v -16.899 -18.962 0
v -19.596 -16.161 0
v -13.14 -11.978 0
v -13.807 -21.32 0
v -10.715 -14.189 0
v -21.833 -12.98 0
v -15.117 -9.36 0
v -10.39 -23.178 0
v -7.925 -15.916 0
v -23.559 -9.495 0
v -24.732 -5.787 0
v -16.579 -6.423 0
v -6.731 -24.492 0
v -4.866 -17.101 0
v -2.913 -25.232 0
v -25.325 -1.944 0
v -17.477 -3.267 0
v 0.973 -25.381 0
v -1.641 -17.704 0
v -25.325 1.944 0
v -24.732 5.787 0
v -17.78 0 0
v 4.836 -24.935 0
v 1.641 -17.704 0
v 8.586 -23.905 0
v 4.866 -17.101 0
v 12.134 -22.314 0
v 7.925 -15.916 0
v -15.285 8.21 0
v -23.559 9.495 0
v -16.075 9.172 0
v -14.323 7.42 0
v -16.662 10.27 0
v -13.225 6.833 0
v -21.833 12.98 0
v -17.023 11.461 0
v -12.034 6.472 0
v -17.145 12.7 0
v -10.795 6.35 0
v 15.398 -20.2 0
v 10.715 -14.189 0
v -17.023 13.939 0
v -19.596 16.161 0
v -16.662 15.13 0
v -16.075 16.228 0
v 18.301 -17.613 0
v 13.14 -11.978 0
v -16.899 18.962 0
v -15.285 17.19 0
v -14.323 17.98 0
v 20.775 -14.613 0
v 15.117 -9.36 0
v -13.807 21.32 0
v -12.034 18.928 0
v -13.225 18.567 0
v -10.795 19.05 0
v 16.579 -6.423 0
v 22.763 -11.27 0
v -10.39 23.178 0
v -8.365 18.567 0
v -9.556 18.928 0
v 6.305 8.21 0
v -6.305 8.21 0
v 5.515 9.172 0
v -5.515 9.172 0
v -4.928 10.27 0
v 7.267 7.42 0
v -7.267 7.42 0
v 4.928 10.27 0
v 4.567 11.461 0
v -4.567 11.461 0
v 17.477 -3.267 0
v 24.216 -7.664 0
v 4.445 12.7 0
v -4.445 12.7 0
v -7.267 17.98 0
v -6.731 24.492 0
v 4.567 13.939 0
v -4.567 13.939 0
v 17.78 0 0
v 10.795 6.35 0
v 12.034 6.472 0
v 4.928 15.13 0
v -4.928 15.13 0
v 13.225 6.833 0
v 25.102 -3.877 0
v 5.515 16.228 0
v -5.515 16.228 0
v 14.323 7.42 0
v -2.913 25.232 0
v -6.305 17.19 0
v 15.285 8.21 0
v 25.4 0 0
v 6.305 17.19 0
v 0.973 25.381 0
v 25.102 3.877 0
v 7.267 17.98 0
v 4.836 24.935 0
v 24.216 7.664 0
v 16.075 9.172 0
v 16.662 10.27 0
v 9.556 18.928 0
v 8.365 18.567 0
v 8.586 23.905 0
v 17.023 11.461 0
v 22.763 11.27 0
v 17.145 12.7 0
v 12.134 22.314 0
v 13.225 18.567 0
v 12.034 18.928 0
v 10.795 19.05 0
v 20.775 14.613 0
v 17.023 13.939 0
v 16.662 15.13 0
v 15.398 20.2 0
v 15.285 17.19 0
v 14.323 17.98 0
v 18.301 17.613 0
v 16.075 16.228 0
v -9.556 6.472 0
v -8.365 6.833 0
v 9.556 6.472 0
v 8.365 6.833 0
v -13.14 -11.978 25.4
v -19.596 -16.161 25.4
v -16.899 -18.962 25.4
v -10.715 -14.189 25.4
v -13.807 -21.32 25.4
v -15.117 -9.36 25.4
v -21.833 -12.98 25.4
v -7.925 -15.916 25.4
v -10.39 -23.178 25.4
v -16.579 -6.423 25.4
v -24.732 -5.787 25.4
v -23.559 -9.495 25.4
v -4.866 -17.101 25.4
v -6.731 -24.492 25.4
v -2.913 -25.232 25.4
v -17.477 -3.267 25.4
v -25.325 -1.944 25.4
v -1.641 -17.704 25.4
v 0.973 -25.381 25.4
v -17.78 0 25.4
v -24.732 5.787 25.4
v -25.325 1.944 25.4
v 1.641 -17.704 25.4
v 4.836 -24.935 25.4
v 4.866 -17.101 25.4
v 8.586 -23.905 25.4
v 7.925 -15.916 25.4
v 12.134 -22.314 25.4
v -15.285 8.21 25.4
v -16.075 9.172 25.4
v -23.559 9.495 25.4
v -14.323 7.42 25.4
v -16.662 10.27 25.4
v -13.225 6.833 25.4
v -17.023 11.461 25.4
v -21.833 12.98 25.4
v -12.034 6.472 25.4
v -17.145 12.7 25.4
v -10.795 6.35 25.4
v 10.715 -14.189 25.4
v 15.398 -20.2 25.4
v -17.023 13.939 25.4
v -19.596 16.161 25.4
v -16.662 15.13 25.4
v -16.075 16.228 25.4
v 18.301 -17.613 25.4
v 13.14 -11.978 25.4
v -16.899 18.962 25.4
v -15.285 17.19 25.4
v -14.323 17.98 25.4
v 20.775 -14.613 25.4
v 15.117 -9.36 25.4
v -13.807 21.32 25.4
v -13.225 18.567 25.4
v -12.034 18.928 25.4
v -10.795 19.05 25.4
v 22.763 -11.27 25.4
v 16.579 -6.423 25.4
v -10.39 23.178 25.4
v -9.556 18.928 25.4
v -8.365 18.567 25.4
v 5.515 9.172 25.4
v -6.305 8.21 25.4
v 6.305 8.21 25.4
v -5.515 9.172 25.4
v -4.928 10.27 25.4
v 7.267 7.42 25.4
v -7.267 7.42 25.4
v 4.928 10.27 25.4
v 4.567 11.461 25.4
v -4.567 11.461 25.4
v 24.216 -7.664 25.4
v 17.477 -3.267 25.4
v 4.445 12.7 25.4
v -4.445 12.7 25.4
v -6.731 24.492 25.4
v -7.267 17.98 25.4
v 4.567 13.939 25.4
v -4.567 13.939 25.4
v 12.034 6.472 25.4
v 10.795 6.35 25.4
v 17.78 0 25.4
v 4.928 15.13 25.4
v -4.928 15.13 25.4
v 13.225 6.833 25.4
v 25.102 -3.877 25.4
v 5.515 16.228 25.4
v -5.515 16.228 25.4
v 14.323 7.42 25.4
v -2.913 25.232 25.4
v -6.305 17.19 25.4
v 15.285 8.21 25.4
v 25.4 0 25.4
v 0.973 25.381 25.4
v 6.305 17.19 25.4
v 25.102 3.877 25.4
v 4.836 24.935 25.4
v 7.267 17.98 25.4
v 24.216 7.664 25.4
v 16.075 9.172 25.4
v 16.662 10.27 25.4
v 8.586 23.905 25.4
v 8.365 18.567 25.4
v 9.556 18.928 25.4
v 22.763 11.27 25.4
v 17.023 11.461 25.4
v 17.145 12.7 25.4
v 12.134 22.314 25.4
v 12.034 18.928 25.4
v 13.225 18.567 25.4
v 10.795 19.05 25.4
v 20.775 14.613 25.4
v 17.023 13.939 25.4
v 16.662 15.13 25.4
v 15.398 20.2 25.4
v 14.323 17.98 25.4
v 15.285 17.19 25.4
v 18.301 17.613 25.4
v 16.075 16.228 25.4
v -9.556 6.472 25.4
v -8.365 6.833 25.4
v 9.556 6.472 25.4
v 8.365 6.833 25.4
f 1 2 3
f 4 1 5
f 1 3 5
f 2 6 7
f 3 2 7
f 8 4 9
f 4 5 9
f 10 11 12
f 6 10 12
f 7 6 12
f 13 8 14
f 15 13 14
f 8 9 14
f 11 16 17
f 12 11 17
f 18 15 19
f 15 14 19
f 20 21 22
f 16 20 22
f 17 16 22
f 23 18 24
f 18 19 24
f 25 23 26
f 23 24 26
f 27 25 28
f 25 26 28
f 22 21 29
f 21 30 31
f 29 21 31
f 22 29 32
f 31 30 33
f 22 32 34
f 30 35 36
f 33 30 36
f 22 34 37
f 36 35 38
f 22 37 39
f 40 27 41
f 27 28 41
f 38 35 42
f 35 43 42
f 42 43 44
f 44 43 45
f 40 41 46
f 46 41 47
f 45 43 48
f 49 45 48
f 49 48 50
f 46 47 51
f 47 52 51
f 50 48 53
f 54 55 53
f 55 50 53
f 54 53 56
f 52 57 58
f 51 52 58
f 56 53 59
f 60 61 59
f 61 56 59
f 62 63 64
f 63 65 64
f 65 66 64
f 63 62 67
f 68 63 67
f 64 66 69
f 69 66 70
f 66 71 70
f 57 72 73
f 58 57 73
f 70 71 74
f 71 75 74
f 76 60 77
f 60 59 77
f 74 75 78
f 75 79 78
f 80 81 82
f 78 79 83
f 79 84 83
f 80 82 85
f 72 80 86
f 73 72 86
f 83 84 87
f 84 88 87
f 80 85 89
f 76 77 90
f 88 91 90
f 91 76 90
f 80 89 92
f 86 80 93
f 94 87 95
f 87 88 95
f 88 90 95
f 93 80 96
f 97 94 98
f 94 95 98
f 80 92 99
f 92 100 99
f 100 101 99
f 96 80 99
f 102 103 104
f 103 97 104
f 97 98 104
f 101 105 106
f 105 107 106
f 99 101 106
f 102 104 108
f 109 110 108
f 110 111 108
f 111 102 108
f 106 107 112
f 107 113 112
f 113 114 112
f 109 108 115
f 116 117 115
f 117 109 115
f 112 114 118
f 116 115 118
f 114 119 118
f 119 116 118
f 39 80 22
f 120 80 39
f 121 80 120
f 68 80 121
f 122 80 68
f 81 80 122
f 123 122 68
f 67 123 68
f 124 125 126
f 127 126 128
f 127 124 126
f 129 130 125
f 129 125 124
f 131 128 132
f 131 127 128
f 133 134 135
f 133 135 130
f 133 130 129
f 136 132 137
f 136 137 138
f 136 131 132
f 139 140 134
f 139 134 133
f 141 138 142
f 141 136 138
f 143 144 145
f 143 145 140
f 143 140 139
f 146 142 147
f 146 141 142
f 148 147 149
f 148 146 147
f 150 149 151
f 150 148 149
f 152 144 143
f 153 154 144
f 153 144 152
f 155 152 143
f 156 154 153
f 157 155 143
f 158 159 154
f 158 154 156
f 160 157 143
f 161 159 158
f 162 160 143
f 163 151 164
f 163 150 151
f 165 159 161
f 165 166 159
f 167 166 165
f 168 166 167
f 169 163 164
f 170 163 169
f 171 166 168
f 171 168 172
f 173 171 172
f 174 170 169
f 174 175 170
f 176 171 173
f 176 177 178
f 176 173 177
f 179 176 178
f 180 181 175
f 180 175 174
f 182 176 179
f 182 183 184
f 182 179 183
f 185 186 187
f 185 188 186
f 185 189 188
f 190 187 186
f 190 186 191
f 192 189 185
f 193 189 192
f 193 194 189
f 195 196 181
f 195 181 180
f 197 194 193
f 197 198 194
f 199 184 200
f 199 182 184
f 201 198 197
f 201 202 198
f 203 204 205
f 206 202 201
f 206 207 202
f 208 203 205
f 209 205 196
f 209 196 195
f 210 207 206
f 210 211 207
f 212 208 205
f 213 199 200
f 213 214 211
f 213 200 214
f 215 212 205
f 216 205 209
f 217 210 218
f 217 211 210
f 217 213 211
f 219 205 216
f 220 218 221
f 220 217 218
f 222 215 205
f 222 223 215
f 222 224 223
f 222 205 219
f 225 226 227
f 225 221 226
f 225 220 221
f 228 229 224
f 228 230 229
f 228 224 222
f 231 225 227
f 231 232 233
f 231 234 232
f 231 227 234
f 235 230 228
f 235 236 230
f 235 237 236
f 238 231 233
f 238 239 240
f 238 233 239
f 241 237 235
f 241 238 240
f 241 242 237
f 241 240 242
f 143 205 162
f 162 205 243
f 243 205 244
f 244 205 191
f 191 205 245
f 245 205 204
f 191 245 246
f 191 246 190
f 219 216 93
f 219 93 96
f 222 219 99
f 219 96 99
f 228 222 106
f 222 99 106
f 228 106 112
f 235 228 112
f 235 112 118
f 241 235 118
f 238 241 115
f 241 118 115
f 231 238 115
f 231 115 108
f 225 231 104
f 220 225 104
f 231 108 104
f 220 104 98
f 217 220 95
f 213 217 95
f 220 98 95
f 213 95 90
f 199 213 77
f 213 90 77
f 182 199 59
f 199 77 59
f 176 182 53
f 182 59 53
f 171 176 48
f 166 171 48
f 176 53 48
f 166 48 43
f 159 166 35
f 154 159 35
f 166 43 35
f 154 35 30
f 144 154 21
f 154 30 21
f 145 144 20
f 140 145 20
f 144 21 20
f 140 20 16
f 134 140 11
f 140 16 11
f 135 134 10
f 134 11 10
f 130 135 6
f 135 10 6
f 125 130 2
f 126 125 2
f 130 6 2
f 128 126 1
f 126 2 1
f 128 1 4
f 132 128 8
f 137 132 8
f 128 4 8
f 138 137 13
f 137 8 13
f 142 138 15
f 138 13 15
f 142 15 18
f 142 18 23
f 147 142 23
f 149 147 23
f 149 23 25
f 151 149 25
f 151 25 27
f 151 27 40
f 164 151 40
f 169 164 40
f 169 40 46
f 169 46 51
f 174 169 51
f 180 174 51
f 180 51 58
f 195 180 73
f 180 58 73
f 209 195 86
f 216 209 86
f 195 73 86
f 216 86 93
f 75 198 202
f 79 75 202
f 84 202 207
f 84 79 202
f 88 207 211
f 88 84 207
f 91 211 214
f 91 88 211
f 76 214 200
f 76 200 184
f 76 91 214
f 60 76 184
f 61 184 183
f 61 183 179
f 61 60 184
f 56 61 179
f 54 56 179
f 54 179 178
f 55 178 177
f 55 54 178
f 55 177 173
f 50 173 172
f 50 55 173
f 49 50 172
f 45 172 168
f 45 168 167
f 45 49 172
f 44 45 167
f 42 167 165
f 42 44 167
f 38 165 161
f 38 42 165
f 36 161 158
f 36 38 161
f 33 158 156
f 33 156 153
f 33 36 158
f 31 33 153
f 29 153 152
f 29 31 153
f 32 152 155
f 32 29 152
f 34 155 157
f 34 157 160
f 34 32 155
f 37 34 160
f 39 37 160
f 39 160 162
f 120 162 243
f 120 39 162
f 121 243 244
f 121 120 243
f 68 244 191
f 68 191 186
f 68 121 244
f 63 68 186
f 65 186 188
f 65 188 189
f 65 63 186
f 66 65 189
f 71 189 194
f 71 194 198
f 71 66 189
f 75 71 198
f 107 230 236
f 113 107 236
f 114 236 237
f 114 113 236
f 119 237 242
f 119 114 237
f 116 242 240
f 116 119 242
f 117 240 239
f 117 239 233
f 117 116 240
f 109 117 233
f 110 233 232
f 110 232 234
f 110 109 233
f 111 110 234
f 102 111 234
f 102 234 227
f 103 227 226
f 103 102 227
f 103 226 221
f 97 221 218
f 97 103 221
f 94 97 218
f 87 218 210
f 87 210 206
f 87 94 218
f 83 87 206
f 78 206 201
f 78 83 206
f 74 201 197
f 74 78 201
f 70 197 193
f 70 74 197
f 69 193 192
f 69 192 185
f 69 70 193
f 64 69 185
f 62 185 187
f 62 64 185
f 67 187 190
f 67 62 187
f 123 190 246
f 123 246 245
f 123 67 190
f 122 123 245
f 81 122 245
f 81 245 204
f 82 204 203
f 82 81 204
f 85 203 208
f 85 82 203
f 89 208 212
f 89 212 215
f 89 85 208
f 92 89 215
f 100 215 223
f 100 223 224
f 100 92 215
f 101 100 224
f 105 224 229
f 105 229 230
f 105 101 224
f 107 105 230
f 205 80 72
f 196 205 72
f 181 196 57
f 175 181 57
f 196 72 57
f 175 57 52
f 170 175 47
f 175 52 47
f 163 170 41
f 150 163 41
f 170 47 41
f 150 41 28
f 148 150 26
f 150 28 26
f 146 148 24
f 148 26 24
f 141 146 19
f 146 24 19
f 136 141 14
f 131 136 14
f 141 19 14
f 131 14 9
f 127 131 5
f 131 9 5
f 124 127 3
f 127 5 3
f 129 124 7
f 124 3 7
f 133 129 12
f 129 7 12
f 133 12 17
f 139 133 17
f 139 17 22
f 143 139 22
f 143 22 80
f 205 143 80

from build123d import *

# Parameters (mm, degrees)
F0_R     = 25.4
F0_R_2   = 6.35
F1_DEPTH = 25.4


with BuildPart() as f1:
    # F0 (on Top) → F1 (new body)
    with BuildSketch(Plane.XY):
        Circle(F0_R)
        with BuildLine():
            Line((-17.78, 0), (17.78, 0))
            ThreePointArc((17.78, 0), (0, -17.78), (-17.78, 0))
        make_face(mode=Mode.SUBTRACT)
        with Locations((-10.795, 12.7)):
            Circle(F0_R_2, mode=Mode.SUBTRACT)
        with Locations((10.795, 12.7)):
            Circle(F0_R_2, mode=Mode.SUBTRACT)
    extrude(amount=F1_DEPTH)


solid = f1.part
